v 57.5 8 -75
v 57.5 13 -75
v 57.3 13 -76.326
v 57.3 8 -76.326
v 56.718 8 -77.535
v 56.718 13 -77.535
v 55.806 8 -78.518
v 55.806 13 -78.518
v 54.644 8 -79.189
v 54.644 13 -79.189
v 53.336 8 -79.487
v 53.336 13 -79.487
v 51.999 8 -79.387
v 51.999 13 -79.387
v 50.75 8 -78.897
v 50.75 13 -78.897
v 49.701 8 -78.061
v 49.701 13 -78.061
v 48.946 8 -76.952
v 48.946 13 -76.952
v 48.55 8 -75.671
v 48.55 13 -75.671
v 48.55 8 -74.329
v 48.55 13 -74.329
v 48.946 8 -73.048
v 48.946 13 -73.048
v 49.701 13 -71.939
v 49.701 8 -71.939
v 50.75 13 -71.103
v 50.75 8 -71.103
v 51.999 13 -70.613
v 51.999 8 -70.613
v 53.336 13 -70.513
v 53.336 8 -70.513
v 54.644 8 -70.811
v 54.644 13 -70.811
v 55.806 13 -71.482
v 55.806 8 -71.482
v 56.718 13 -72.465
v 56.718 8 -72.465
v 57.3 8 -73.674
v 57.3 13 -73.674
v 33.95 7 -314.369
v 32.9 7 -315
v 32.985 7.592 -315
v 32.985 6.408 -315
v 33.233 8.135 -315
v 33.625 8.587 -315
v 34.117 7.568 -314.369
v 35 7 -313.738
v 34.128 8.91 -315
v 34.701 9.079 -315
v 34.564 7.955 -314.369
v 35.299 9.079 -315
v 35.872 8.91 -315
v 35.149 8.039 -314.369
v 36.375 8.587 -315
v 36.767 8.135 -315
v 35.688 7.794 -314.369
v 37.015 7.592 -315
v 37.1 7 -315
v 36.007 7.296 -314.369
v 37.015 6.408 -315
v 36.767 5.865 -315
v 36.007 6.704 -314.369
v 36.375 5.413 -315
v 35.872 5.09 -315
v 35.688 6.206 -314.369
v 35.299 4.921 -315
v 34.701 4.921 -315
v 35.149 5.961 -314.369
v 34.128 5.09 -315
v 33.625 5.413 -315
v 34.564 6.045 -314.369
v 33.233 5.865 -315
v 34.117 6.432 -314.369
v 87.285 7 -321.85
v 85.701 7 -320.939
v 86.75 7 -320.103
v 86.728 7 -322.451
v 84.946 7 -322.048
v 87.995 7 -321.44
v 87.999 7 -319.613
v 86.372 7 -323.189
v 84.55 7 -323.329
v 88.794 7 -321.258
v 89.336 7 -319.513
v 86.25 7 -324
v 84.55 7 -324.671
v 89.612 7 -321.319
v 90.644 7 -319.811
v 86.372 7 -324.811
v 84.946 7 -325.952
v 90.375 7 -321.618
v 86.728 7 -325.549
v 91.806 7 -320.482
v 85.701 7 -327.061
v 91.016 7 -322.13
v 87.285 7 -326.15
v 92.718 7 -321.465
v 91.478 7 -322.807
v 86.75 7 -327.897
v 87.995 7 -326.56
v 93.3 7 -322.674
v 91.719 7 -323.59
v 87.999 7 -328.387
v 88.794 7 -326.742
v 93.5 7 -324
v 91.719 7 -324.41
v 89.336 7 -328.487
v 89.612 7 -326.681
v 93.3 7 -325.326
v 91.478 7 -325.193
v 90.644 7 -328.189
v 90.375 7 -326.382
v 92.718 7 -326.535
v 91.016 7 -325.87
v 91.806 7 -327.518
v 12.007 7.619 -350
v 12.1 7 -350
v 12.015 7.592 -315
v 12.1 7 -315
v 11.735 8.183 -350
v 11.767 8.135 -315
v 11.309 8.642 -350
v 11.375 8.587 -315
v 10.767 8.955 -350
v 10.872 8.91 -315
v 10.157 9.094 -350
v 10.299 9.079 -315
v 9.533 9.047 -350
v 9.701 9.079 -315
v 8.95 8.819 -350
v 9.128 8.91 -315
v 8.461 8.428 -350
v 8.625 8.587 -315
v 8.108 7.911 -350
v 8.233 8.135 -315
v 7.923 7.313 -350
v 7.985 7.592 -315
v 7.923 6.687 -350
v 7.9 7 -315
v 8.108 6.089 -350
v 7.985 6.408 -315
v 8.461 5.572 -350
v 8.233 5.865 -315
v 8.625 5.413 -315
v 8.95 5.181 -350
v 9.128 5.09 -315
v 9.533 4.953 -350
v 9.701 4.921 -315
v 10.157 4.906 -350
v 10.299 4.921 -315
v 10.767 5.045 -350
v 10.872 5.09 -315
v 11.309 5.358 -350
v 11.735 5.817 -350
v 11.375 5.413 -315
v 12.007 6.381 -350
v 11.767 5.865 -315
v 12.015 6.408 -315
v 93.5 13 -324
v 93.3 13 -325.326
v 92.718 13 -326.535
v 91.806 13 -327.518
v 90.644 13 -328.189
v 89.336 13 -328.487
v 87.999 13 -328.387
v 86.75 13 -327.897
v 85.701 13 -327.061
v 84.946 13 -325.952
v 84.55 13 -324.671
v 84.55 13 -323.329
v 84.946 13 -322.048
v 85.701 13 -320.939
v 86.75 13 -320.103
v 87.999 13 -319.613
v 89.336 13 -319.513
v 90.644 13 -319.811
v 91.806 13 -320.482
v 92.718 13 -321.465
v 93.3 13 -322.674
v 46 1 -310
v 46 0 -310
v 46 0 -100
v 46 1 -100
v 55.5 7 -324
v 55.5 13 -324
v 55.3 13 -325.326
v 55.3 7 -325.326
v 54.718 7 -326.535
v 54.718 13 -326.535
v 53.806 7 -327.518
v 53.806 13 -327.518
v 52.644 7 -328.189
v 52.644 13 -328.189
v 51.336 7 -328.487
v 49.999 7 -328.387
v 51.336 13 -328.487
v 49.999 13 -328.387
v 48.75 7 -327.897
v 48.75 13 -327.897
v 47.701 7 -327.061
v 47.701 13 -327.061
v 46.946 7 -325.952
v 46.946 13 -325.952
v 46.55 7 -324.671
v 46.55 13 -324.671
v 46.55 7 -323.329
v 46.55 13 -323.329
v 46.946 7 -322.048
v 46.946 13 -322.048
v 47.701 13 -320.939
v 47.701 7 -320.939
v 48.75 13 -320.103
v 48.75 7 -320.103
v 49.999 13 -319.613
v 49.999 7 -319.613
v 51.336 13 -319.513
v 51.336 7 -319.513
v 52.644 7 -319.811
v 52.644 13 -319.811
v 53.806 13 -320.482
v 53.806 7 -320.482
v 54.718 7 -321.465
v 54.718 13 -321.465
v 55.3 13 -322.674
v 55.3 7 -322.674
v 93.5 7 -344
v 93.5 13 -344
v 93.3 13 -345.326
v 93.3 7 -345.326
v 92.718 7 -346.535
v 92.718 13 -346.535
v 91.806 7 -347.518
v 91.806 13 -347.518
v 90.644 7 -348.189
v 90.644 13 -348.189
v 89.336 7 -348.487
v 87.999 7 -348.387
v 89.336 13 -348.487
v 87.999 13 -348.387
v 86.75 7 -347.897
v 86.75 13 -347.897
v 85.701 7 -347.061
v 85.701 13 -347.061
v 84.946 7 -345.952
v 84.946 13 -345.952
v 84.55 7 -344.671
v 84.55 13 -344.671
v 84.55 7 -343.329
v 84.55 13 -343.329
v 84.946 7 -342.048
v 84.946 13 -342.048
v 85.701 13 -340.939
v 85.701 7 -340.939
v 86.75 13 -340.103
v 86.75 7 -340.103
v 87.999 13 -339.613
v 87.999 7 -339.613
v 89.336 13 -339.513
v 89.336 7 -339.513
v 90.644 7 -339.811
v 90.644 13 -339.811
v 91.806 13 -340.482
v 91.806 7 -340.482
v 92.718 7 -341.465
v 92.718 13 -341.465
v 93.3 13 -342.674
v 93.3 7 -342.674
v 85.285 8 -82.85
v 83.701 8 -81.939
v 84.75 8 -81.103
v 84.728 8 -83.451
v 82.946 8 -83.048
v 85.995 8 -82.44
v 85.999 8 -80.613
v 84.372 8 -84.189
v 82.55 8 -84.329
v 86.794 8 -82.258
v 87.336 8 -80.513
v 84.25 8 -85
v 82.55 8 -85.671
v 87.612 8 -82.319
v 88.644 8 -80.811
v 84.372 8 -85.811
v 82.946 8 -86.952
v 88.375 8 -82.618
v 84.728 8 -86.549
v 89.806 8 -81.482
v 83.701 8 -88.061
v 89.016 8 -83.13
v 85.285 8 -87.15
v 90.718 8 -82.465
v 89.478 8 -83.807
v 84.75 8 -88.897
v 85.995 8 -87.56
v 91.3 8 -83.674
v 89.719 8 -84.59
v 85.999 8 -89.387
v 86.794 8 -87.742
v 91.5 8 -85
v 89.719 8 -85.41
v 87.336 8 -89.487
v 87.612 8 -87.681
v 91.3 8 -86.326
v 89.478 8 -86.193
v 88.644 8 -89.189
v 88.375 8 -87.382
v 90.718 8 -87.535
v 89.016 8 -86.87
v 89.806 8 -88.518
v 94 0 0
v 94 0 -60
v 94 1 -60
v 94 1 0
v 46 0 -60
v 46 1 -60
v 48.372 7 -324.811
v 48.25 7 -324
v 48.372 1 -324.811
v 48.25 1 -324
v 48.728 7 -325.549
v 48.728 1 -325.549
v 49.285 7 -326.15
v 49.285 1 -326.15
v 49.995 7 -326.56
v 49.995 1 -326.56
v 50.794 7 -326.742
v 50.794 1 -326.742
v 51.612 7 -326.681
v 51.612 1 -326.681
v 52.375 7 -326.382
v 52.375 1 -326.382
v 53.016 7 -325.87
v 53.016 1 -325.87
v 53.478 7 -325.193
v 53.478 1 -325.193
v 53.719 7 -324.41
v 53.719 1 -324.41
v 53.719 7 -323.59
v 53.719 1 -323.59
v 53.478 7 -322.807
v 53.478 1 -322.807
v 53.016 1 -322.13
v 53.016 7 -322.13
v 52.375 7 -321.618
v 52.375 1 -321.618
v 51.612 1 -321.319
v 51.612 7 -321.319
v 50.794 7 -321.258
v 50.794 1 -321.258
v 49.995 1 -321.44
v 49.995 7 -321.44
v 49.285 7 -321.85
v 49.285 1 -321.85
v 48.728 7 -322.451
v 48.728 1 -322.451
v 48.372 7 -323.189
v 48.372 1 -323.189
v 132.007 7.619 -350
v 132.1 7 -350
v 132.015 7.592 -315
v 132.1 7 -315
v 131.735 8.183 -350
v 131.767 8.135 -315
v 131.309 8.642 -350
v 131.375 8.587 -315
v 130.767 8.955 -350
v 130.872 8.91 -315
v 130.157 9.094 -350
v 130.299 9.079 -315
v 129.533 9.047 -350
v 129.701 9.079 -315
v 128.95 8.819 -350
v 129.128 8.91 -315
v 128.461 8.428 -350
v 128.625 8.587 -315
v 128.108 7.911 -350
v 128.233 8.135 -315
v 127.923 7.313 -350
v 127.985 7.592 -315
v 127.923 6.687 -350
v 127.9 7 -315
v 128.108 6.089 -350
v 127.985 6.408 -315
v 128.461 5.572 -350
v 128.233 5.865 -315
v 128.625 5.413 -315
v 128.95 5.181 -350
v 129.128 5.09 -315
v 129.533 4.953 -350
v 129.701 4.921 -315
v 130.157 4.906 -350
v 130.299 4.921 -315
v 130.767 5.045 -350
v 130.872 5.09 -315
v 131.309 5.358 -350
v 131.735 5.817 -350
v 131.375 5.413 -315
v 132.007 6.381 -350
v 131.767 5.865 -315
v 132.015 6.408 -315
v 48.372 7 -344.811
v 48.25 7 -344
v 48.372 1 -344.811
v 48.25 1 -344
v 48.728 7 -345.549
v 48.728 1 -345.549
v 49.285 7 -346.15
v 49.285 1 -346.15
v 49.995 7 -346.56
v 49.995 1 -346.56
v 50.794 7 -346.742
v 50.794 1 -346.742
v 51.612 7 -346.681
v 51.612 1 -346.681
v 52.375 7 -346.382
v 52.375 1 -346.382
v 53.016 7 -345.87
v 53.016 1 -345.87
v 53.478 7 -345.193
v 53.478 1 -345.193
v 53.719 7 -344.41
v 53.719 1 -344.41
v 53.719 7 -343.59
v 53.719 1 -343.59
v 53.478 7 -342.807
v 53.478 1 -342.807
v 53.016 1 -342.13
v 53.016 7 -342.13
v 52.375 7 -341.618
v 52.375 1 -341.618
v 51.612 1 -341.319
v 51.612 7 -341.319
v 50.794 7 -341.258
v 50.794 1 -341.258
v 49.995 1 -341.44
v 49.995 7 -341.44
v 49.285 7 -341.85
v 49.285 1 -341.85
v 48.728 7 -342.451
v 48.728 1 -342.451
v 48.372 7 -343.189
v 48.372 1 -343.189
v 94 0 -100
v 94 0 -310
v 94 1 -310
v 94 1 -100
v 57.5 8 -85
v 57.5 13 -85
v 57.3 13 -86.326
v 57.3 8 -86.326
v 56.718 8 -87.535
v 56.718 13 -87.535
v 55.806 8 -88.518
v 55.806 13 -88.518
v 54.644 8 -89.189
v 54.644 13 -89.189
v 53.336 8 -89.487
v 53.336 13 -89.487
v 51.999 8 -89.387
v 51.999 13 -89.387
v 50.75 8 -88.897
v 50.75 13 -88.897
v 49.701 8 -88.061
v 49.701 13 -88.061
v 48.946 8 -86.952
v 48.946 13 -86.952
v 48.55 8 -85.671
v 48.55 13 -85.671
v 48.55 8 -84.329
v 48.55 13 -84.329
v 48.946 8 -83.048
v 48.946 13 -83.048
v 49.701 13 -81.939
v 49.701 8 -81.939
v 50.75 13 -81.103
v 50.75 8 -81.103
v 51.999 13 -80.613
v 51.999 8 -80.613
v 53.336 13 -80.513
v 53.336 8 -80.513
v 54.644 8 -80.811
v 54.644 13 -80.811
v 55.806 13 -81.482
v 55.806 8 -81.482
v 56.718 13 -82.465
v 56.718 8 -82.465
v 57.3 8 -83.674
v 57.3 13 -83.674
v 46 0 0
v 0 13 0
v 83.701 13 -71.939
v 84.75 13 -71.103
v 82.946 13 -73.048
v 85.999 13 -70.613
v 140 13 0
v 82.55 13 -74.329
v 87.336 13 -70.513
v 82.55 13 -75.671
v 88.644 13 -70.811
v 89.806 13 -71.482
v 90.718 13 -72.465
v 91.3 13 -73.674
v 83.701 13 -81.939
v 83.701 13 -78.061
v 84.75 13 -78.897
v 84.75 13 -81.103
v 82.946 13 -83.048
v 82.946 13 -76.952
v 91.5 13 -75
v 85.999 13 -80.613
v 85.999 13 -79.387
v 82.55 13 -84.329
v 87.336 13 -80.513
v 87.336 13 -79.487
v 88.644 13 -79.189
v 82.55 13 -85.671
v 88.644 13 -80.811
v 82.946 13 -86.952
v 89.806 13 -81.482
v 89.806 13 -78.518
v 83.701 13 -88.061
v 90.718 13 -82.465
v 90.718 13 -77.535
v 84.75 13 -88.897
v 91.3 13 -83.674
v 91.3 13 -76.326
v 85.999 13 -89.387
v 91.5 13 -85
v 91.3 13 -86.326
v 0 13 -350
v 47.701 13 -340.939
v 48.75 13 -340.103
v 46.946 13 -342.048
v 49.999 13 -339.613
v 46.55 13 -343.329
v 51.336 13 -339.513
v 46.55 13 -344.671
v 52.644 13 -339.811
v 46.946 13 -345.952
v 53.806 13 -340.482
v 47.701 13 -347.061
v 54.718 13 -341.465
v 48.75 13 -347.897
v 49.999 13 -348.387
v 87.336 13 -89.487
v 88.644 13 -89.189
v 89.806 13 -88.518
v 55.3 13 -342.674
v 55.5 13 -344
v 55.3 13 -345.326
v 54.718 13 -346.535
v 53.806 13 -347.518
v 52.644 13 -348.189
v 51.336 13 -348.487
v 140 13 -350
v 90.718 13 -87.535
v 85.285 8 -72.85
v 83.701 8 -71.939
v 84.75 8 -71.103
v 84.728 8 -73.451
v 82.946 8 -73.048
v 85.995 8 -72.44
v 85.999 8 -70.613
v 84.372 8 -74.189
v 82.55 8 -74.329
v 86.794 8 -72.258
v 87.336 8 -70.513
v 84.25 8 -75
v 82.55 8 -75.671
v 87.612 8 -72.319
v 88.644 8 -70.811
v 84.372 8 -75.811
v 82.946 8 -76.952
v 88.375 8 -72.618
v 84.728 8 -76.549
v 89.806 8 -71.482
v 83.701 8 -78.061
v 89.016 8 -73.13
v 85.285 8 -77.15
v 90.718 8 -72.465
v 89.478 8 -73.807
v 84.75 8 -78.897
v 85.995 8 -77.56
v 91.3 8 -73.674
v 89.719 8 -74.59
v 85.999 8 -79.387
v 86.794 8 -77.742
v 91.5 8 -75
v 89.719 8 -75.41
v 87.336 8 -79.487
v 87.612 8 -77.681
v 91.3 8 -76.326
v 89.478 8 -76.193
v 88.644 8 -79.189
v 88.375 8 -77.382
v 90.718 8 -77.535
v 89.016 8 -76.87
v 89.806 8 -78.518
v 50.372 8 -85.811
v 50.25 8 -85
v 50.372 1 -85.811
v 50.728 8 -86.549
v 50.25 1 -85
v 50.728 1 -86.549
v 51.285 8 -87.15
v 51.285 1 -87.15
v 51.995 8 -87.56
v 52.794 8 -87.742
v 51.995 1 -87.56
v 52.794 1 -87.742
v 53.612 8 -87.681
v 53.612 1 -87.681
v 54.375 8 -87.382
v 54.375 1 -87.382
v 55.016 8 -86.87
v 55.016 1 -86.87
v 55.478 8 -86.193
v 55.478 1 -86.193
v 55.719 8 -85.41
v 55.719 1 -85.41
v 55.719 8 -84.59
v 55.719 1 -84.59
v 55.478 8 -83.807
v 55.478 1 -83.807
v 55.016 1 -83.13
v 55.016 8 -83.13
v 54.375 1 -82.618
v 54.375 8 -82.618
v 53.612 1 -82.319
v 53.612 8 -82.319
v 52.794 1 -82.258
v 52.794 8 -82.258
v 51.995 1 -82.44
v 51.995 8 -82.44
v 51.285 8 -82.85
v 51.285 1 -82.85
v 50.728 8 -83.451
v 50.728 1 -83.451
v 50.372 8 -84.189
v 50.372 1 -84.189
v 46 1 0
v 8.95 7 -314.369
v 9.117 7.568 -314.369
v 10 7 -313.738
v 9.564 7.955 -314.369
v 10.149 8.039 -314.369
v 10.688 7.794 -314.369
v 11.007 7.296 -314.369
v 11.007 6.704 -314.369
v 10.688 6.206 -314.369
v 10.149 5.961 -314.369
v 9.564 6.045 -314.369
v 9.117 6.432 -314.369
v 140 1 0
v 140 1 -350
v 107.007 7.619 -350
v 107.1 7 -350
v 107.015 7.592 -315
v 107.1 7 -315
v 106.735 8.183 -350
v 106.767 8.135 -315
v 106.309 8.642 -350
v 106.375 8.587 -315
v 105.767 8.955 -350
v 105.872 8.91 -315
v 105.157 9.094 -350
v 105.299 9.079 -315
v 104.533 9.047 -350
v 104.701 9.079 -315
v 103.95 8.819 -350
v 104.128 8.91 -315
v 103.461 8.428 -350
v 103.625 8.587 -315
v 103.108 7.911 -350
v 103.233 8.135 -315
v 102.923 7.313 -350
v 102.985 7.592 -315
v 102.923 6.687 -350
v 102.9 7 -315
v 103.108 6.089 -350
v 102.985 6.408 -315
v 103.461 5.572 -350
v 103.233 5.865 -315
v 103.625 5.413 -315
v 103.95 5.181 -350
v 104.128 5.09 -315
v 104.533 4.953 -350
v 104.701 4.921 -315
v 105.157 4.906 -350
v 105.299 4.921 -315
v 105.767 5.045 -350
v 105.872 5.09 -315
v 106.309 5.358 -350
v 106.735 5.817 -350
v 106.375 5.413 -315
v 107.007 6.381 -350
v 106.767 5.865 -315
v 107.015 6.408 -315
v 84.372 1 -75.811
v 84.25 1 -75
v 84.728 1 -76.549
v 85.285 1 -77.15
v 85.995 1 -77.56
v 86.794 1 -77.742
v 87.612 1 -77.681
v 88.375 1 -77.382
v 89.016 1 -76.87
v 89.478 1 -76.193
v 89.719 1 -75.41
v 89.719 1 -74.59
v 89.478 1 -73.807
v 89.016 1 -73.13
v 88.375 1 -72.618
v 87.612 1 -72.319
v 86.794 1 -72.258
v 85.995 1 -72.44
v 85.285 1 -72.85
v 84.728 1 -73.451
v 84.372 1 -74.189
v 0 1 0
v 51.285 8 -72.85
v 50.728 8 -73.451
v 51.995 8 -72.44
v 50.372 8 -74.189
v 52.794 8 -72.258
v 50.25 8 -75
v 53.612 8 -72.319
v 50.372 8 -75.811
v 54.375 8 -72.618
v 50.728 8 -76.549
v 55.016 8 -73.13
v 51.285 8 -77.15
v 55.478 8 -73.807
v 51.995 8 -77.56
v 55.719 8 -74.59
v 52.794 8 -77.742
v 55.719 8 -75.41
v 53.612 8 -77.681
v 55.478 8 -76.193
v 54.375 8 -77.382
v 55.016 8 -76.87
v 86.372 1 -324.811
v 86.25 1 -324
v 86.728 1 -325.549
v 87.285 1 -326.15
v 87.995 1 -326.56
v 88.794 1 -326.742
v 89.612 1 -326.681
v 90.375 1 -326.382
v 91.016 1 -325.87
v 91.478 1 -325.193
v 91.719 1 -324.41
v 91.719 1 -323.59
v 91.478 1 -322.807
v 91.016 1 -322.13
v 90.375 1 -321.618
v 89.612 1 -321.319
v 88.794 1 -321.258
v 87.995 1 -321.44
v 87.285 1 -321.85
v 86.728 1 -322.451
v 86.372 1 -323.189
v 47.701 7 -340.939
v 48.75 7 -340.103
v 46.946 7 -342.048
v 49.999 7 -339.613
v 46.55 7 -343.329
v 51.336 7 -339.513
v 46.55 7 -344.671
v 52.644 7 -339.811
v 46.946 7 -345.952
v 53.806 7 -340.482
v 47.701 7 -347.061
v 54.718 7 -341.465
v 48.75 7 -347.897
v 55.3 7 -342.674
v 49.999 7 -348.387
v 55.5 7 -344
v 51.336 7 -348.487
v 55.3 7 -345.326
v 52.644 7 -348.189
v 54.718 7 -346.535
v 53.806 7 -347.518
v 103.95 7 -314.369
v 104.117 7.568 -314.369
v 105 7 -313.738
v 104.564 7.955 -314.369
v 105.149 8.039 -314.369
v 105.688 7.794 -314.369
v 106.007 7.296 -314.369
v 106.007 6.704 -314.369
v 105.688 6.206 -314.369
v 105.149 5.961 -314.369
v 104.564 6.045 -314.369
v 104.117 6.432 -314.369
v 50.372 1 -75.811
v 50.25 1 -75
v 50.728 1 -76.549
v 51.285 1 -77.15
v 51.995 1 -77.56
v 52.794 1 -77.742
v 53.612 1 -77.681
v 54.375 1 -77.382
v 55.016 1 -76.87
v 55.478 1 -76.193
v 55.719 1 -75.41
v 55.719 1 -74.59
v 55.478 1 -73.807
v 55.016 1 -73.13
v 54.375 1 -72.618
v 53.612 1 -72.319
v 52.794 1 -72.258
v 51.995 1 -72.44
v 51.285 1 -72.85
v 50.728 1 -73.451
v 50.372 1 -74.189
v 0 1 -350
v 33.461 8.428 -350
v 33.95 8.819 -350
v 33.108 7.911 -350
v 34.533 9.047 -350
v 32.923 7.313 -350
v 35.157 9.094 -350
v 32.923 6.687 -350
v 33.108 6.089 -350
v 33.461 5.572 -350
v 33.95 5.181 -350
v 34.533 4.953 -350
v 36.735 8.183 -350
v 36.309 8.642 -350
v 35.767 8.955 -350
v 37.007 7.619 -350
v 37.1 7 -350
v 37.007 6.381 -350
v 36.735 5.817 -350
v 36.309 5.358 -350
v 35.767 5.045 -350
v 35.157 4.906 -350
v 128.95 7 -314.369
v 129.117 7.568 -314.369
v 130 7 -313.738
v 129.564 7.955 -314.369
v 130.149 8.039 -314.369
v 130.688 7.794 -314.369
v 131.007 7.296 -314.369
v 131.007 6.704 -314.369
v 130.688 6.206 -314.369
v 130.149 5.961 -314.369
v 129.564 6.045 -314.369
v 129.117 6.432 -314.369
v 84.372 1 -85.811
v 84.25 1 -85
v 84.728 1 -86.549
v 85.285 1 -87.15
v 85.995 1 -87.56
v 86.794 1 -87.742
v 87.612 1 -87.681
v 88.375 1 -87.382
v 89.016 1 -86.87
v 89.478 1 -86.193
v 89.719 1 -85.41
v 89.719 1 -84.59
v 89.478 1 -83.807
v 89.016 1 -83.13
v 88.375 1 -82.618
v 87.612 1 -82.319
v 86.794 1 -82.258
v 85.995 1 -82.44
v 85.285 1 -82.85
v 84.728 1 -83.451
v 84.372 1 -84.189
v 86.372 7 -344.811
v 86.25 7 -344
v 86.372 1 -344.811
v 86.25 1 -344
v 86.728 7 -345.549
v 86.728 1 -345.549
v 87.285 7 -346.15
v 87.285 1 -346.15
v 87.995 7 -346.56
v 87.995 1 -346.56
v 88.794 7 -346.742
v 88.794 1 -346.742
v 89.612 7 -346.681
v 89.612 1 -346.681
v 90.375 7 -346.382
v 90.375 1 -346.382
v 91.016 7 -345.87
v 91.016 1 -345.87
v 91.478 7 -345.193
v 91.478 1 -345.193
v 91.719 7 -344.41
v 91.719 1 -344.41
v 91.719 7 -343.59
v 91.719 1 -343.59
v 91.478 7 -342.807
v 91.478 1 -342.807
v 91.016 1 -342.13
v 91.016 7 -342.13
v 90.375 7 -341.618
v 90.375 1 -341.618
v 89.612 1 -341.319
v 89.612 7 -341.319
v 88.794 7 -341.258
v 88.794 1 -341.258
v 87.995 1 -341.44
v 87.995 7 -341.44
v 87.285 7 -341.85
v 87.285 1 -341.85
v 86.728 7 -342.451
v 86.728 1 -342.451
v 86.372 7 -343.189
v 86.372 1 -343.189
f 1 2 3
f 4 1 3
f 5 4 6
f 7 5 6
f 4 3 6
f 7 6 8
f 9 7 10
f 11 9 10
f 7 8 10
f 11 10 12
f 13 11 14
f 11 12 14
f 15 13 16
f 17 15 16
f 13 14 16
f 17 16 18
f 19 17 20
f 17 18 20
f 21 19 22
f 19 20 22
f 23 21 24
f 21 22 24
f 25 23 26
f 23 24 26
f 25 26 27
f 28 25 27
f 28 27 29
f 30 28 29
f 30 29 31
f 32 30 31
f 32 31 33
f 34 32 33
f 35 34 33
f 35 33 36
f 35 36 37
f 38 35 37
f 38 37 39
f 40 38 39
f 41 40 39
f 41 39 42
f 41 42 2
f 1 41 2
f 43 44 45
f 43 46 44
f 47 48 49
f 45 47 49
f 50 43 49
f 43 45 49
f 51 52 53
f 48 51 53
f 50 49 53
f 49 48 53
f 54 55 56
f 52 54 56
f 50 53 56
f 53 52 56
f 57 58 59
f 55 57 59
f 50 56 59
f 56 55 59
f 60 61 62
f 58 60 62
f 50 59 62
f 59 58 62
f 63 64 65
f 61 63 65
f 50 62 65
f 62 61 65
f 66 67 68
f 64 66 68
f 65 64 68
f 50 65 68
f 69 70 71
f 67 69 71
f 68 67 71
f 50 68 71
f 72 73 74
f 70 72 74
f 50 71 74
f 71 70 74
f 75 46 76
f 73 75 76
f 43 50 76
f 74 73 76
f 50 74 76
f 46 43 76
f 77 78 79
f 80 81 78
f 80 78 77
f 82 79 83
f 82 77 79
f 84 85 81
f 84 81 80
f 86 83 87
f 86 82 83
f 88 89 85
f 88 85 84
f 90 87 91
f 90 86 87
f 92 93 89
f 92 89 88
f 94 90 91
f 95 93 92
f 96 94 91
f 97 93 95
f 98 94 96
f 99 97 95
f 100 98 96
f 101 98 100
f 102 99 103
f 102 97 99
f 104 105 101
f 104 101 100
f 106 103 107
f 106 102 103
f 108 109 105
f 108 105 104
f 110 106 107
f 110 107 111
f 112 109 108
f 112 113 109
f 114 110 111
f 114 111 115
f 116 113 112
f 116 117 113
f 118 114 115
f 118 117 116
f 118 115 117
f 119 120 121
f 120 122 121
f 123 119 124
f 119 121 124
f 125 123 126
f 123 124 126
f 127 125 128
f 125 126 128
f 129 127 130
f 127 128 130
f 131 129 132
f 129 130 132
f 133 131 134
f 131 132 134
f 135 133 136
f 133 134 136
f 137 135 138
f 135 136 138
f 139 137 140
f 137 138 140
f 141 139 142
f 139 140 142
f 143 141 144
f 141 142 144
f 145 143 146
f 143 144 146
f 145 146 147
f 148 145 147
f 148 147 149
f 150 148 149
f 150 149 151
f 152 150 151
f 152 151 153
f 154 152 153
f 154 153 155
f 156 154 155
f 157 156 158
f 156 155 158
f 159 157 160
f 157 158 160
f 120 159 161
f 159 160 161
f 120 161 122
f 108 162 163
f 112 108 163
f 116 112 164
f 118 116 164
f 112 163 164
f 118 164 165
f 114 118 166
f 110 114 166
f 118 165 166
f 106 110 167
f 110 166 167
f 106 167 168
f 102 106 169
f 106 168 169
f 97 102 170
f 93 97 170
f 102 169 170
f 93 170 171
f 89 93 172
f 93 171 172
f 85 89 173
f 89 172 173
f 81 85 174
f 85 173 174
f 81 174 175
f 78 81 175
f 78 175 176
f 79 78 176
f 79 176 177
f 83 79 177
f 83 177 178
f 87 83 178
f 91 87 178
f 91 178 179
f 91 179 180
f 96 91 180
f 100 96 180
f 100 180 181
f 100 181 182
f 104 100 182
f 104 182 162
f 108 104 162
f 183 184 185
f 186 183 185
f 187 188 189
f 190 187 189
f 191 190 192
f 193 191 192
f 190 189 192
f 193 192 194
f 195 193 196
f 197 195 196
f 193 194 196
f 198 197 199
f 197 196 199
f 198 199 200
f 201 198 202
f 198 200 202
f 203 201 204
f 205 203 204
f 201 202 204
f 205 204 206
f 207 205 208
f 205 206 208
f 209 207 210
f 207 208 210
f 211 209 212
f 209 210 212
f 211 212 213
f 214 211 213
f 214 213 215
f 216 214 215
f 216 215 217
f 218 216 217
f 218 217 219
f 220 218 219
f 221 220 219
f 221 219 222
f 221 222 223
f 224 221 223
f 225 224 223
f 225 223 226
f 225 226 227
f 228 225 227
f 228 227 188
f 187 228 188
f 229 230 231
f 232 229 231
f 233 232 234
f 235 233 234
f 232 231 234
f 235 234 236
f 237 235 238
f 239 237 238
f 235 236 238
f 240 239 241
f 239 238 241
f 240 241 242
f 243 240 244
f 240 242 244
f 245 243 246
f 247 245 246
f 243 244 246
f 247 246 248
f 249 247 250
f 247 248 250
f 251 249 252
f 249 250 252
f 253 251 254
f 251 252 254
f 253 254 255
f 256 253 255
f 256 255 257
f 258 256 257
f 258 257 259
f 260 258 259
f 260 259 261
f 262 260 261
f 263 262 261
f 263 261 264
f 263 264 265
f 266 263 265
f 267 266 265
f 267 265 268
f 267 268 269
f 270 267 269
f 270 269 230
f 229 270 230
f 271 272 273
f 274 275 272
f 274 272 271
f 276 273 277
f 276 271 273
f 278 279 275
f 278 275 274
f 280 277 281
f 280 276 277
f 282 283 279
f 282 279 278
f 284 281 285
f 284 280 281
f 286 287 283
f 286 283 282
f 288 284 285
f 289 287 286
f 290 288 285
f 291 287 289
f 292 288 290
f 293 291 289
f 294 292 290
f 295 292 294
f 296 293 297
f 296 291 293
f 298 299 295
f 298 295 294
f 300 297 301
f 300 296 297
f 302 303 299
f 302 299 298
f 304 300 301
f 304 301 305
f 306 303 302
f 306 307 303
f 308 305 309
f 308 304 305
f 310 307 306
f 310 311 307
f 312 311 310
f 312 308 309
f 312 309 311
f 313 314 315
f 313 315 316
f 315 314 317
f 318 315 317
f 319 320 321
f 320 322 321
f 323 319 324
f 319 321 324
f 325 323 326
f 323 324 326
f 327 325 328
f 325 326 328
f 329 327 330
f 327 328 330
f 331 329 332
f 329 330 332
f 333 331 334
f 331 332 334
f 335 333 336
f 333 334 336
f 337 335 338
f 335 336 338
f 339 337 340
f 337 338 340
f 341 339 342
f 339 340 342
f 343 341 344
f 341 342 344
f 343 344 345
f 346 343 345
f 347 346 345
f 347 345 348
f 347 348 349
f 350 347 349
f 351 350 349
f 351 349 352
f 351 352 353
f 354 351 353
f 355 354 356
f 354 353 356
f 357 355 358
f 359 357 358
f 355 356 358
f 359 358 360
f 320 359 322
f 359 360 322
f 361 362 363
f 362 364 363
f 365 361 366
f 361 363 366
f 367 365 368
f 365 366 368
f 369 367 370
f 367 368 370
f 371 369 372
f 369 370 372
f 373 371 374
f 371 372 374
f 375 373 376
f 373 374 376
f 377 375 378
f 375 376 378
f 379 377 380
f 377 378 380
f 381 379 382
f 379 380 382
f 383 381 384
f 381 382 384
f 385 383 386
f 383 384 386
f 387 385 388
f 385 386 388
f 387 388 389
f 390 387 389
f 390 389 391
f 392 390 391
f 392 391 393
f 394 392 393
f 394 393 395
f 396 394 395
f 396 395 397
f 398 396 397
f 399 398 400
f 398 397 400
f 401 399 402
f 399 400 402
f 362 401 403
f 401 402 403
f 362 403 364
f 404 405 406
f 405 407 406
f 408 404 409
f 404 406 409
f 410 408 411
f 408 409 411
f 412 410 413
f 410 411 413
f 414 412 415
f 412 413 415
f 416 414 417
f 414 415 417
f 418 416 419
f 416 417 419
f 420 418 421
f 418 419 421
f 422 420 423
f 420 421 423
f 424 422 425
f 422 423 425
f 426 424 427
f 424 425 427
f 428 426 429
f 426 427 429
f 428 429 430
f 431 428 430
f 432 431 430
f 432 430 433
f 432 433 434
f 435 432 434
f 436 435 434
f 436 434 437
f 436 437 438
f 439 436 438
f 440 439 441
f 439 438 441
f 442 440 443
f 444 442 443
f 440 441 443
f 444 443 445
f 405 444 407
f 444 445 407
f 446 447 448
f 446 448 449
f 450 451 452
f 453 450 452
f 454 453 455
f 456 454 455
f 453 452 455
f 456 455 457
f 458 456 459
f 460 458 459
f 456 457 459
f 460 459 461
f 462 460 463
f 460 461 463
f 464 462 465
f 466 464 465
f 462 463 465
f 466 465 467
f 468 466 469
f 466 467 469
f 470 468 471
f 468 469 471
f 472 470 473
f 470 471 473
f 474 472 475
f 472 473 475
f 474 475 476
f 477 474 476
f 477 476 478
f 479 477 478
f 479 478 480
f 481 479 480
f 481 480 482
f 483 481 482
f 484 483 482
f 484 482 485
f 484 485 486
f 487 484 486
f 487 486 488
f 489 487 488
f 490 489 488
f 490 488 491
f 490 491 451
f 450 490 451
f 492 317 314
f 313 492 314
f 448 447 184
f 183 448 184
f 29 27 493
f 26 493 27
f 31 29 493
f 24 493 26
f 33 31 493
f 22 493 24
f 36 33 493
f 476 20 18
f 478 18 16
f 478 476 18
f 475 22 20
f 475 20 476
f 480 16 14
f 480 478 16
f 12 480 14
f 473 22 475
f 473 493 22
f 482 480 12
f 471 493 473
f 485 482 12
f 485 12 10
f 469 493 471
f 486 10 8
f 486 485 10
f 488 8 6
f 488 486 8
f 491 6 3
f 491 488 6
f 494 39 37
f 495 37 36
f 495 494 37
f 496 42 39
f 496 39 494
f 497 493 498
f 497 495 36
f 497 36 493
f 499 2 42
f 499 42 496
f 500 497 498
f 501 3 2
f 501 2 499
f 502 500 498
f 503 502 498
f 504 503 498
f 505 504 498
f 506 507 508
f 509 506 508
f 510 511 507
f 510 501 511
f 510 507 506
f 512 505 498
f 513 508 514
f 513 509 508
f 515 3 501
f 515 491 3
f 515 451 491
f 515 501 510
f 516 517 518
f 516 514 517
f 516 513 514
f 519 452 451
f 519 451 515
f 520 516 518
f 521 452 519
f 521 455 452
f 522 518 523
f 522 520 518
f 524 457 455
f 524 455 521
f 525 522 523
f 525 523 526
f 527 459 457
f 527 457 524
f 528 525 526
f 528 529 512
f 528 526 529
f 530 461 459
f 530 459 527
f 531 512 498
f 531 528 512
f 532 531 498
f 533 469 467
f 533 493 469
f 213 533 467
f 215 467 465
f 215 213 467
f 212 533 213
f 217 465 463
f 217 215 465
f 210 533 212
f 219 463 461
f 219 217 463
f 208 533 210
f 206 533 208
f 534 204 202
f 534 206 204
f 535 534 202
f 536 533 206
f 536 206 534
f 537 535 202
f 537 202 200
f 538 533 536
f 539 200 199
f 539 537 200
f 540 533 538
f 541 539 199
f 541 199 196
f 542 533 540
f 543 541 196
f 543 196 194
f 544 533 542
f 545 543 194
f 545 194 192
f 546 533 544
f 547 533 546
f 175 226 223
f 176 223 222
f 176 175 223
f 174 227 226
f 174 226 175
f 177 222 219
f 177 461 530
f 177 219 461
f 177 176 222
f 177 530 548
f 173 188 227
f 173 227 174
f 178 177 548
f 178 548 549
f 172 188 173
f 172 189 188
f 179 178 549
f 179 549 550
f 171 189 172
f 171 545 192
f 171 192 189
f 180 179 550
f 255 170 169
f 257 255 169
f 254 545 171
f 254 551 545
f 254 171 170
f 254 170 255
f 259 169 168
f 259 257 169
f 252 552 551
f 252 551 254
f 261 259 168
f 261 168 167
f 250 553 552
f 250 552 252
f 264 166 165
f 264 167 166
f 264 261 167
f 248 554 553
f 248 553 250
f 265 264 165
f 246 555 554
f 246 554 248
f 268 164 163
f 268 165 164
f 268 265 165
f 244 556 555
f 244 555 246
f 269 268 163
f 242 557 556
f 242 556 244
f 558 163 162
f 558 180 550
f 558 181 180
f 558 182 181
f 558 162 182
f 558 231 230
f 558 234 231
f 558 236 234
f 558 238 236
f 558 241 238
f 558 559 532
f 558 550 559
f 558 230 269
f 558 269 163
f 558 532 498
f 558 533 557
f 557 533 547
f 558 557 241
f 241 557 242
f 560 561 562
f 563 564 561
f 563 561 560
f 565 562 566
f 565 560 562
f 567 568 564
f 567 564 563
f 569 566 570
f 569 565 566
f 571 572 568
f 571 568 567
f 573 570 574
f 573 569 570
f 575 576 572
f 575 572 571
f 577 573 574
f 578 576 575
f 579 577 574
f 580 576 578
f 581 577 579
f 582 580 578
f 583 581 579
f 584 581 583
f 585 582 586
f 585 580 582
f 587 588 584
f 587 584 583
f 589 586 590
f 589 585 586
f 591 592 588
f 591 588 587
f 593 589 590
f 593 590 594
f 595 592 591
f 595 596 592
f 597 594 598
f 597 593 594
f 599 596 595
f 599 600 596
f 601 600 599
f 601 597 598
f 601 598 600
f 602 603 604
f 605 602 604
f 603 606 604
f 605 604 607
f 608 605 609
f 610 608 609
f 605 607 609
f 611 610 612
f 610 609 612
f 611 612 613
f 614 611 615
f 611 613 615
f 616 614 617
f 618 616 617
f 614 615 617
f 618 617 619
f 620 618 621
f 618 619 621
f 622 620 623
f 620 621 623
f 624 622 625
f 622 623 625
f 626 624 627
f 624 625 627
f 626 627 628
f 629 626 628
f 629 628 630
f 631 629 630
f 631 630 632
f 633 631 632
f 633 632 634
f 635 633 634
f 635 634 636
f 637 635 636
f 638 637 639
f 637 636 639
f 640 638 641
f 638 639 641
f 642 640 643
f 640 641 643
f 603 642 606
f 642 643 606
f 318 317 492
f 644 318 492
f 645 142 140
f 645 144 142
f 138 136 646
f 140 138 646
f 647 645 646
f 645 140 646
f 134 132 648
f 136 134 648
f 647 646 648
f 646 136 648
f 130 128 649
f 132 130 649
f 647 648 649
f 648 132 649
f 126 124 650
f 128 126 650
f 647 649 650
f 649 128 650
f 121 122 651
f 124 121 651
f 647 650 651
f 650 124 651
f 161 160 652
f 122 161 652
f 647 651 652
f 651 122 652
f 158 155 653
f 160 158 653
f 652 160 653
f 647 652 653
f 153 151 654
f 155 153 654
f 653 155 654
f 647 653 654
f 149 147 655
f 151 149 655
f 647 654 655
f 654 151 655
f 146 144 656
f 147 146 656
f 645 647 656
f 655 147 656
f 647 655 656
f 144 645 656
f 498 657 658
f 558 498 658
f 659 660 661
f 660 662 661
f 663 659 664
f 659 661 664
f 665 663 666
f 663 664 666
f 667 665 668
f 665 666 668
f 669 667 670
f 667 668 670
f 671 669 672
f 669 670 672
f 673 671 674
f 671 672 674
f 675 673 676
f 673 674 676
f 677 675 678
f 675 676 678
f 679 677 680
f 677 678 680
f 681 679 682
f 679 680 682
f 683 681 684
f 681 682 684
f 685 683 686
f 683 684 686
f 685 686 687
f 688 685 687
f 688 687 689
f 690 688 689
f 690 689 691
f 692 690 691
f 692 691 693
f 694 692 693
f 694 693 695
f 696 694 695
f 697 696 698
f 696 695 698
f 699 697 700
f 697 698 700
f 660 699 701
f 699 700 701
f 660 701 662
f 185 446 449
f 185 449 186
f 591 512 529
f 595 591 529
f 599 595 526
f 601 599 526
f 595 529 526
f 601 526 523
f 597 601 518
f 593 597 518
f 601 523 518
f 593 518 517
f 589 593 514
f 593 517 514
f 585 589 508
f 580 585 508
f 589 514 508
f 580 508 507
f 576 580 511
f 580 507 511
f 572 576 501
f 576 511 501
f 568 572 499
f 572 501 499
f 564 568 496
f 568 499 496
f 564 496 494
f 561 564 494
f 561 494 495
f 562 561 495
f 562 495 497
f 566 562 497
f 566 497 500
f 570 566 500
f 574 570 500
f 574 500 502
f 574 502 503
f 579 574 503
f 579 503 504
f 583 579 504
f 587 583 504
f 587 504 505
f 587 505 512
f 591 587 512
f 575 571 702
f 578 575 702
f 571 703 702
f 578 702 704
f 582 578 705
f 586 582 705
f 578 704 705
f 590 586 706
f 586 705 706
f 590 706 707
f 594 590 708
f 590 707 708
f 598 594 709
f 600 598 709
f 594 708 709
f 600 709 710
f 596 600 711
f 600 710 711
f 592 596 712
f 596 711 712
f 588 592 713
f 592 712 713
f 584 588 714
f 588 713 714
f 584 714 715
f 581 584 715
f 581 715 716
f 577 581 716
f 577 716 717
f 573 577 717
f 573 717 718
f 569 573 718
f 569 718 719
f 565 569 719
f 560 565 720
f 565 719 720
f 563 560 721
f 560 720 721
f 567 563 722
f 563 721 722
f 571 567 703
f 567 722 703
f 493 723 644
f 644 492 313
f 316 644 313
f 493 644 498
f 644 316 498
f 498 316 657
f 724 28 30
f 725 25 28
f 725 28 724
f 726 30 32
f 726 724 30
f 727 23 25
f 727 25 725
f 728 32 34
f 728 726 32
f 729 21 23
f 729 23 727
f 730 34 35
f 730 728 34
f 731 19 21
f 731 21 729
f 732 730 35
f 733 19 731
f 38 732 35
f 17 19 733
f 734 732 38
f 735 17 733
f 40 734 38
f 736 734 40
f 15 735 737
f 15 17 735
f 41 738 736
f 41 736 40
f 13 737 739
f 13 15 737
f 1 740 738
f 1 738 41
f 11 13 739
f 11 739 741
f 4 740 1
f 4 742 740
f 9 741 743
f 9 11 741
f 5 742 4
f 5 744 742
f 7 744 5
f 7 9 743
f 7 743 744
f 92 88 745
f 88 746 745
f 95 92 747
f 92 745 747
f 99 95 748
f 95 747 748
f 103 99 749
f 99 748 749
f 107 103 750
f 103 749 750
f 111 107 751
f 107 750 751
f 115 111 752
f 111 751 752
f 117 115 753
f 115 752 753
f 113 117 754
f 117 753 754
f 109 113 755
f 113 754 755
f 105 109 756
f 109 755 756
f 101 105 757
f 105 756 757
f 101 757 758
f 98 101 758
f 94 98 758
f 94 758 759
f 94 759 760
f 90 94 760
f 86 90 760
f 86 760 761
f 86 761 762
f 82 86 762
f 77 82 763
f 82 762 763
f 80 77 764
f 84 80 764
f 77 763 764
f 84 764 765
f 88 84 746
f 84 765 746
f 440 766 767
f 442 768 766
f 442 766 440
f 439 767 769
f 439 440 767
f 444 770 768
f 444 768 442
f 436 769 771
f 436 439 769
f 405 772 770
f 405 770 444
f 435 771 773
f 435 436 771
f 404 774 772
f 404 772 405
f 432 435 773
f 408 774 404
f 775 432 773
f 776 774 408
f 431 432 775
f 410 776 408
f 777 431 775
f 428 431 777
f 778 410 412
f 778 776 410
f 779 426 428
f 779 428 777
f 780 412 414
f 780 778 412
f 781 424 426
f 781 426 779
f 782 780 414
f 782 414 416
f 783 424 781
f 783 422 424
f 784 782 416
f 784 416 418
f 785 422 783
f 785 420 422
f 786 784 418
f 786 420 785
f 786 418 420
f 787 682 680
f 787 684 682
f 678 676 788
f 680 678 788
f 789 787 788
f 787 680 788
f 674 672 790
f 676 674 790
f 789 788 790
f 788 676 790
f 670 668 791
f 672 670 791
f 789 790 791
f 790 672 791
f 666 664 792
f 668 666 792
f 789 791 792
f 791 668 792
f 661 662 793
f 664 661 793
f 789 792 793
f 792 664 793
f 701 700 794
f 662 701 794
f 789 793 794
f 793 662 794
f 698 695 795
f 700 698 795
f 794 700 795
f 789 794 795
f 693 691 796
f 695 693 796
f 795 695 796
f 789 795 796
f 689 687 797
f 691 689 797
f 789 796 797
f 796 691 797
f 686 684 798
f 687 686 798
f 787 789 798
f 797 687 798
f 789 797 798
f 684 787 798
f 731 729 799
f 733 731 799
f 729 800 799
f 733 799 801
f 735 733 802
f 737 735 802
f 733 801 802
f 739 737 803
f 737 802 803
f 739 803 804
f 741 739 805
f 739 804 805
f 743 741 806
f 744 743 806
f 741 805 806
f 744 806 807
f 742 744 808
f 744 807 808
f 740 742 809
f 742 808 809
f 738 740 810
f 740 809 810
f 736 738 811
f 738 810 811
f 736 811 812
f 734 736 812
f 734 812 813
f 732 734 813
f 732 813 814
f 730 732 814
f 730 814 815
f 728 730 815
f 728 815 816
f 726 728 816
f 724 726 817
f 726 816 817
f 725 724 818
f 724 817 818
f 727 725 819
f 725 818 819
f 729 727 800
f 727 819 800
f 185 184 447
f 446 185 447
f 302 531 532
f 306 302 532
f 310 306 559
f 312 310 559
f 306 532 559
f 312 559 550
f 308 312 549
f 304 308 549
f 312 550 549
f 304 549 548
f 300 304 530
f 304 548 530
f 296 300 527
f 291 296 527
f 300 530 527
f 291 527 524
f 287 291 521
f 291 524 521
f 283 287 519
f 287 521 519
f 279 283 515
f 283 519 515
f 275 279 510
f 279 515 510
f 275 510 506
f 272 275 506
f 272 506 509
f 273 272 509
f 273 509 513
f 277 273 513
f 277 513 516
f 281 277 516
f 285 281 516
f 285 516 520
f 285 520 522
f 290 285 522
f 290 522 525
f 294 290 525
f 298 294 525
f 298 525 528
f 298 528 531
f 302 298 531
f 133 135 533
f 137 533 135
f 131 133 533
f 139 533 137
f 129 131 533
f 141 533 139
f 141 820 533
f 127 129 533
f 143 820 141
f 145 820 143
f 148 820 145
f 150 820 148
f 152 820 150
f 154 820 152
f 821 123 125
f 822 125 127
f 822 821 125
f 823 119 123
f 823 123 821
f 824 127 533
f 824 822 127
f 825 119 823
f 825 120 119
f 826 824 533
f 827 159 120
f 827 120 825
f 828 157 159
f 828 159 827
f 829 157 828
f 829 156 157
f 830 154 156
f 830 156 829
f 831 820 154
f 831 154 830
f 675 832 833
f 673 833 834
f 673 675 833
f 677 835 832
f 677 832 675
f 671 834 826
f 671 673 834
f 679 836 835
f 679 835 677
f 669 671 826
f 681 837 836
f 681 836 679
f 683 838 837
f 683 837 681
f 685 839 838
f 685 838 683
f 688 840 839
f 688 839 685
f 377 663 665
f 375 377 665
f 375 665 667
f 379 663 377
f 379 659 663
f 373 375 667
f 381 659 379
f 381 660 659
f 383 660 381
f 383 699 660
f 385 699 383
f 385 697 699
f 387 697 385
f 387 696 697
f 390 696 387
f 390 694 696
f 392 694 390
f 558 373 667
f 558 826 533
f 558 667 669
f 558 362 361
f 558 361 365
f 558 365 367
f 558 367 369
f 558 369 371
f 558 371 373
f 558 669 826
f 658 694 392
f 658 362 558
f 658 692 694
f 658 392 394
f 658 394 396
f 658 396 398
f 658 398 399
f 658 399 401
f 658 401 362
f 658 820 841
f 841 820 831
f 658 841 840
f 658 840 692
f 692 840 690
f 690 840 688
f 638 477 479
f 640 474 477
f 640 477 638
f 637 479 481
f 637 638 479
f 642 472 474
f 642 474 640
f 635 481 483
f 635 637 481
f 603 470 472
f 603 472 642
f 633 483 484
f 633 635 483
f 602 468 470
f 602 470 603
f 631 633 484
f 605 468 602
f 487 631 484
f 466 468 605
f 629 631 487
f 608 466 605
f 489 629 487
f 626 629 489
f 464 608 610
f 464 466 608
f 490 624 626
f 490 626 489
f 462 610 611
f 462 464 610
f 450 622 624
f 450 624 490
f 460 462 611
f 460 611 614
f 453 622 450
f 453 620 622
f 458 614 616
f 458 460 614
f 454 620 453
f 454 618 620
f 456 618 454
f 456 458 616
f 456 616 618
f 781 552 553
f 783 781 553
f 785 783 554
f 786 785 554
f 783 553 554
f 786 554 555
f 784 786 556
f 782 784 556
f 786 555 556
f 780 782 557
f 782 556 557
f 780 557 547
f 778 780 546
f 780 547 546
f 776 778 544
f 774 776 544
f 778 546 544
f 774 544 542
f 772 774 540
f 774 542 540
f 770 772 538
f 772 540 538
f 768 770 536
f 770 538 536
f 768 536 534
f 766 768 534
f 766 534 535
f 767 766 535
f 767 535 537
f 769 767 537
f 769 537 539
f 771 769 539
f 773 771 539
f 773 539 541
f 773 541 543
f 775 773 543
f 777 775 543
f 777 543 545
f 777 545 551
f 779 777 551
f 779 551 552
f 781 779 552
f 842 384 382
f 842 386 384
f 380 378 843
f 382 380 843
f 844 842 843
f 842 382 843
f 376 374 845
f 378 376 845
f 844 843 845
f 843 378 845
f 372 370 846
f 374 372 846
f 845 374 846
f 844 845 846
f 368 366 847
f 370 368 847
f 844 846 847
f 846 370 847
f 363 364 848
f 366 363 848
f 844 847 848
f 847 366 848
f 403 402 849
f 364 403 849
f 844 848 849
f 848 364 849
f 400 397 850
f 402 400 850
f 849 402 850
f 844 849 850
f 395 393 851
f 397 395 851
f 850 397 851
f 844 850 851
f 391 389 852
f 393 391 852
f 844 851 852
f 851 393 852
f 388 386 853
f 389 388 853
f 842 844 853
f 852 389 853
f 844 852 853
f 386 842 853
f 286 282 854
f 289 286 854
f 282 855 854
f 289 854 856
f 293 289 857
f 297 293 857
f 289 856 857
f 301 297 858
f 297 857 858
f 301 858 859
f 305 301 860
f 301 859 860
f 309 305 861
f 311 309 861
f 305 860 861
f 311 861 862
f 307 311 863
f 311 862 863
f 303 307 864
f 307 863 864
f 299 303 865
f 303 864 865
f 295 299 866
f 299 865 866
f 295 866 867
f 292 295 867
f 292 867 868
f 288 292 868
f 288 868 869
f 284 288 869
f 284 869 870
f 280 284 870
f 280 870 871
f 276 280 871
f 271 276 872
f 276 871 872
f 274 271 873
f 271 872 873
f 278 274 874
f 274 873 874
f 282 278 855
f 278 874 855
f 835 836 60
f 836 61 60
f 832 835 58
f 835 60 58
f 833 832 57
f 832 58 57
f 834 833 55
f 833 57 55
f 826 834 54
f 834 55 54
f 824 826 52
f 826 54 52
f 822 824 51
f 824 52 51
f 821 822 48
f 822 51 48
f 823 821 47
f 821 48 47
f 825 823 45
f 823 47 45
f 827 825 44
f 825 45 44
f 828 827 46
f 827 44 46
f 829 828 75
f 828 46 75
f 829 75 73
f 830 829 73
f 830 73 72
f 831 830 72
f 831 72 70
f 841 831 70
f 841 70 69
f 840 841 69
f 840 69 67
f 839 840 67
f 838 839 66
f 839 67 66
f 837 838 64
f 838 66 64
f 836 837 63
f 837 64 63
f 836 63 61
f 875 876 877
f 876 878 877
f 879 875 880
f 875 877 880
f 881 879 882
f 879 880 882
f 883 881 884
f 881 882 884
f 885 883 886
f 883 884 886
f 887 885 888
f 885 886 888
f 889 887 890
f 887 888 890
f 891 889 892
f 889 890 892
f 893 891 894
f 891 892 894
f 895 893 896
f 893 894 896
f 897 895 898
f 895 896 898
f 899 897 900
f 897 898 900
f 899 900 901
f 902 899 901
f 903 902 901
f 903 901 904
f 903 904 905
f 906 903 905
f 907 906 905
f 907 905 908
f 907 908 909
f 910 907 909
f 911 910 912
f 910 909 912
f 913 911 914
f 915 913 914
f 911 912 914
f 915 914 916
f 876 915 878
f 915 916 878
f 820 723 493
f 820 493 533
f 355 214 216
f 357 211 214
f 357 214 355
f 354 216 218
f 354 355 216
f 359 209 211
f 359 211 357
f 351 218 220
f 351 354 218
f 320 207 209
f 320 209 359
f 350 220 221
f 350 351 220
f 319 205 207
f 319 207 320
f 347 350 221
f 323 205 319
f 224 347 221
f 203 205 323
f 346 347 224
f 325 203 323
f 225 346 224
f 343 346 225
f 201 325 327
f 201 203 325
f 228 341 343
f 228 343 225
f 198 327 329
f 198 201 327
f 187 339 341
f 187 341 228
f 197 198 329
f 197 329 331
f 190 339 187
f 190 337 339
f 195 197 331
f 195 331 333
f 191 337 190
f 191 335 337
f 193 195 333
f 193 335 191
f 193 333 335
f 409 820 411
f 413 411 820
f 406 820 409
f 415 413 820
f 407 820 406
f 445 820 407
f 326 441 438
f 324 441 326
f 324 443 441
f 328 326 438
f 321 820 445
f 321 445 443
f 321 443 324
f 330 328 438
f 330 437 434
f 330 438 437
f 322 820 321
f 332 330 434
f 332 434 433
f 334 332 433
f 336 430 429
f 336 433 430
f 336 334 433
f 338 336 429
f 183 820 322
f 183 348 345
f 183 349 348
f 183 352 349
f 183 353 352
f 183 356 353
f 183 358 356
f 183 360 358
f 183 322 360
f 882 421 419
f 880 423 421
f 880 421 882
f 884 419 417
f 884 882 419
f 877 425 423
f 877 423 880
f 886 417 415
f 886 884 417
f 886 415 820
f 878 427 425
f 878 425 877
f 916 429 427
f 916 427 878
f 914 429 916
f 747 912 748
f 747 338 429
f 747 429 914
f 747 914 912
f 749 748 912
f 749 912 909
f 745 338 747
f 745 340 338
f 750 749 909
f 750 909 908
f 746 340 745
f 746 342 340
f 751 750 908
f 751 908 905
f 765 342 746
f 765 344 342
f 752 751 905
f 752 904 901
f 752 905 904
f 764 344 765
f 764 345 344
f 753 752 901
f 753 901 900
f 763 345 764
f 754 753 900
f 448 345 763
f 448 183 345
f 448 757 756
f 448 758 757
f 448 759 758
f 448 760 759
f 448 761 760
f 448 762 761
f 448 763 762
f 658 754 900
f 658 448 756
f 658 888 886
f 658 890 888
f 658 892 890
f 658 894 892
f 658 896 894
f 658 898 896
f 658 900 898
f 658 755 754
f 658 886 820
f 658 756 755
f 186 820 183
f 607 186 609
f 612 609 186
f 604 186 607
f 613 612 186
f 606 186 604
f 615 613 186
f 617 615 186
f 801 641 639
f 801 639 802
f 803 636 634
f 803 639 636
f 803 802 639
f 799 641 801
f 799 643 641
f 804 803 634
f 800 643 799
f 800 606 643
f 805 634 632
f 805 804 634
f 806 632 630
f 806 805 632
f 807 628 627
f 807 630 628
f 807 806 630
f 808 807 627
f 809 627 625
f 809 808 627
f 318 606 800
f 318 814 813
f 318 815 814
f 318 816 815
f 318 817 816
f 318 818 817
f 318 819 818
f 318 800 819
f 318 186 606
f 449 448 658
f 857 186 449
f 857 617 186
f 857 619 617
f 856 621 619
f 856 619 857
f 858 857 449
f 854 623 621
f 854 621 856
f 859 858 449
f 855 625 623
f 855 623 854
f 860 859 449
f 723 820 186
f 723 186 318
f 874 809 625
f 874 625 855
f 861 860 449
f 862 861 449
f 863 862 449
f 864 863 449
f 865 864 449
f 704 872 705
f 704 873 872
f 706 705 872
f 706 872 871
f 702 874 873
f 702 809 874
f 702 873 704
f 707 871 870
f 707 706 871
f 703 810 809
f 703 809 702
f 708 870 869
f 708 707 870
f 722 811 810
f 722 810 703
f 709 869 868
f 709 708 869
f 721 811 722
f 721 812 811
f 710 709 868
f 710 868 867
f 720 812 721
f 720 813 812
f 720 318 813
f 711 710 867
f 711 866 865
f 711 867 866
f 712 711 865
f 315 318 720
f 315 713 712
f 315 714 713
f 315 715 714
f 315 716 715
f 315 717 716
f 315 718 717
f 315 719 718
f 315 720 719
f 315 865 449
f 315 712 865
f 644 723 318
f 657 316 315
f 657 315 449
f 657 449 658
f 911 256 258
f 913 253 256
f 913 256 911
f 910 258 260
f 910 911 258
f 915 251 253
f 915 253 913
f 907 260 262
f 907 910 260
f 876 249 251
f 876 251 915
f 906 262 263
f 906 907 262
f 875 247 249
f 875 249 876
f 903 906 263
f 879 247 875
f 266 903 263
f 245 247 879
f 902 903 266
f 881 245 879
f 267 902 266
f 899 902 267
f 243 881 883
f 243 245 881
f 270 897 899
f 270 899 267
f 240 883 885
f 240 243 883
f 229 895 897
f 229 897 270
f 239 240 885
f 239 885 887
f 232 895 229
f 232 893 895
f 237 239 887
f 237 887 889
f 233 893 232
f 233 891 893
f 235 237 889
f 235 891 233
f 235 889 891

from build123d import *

# Parameters (mm, degrees)
SZKIC1_W                                             = 140
SZKIC1_H                                             = 350
DODANIE_WYCI_GNI_CIE1_DEPTH                          = 13
SZKIC2_W                                             = 46
SZKIC2_H                                             = 350
WYTNIJ_WYCI_GNI_CIE1_DEPTH                           = 1
OTW_R_GWINTOWANY_M5X0_81_D                           = 4.2
OTW_R_GWINTOWANY_M5X0_81_DEPTH                       = 35
OTW_R_GWINTOWANY_M5X0_81_TIP                         = 1.2618073
SZKIC12_W                                            = 48
SZKIC12_H                                            = 40
WYTNIJ_WYCI_GNI_CIE3_DEPTH                           = 1
POG_BIENIE_WALCOWE_POD_M5_WKR_T_DO_CZ_CI_D           = 5.5
POG_BIENIE_WALCOWE_POD_M5_WKR_T_DO_CZ_CI_CBORE_D     = 9
POG_BIENIE_WALCOWE_POD_M5_WKR_T_DO_CZ_CI_CBORE_DEPTH = 6
POG_BIENIE_WALCOWE_POD_M5_WKR_T_DO_C_2_D             = 5.5
POG_BIENIE_WALCOWE_POD_M5_WKR_T_DO_C_2_CBORE_D       = 9
POG_BIENIE_WALCOWE_POD_M5_WKR_T_DO_C_2_CBORE_DEPTH   = 5


with BuildPart() as part:
    # Szkic1 → Dodanie-wyciągnięcie1 (new body)
    with BuildSketch(Plane(origin=(0, 0, 0), x_dir=(1, 0, 0), z_dir=(0, 1, 0))):
        with Locations((70, 175)):
            Rectangle(SZKIC1_W, SZKIC1_H)
    extrude(amount=DODANIE_WYCI_GNI_CIE1_DEPTH)

    # Szkic2 → Wytnij-wyciągnięcie1 (cut)
    with BuildSketch(Plane.XZ):
        with Locations((23, -175)):
            Rectangle(SZKIC2_W, SZKIC2_H)
        with Locations((117, -175)):
            Rectangle(SZKIC2_W, SZKIC2_H)
    extrude(amount=-WYTNIJ_WYCI_GNI_CIE1_DEPTH, mode=Mode.SUBTRACT)

    # Otwór gwintowany M5x0.81
    with Locations(Plane(origin=(0, 0, -350), x_dir=(-1, 0, 0), z_dir=(0, 0, -1))):
        with Locations((-130, 7), (-105, 7), (-35, 7), (-10, 7)):
            Hole(OTW_R_GWINTOWANY_M5X0_81_D / 2, depth=OTW_R_GWINTOWANY_M5X0_81_DEPTH)
            with Locations((0, 0, -(OTW_R_GWINTOWANY_M5X0_81_DEPTH + OTW_R_GWINTOWANY_M5X0_81_TIP / 2))):  # 118° drill point
                Cone(0, OTW_R_GWINTOWANY_M5X0_81_D / 2, OTW_R_GWINTOWANY_M5X0_81_TIP, mode=Mode.SUBTRACT)

    # Szkic12 → Wytnij-wyciągnięcie3 (cut)
    with BuildSketch(Plane(origin=(0, 0, 0), x_dir=(-1, 0, 0), z_dir=(0, -1, 0))):
        with Locations((-70, 80)):
            Rectangle(SZKIC12_W, SZKIC12_H)
        with Locations((-70, 330)):
            Rectangle(SZKIC12_W, SZKIC12_H)
    extrude(amount=-WYTNIJ_WYCI_GNI_CIE3_DEPTH, mode=Mode.SUBTRACT)

    # Pog_bienie walcowe pod M5 Wkr_t do cz_ci (through all)
    with Locations(Plane(origin=(0, 13, 0), x_dir=(1, 0, 0), z_dir=(0, 1, 0))):
        with Locations((51, 344), (89, 344), (51, 324), (89, 324)):
            CounterBoreHole(POG_BIENIE_WALCOWE_POD_M5_WKR_T_DO_CZ_CI_D / 2, POG_BIENIE_WALCOWE_POD_M5_WKR_T_DO_CZ_CI_CBORE_D / 2, POG_BIENIE_WALCOWE_POD_M5_WKR_T_DO_CZ_CI_CBORE_DEPTH)

    # Pog_bienie walcowe pod M5 Wkr_t do c 2 (through all)
    with Locations(Plane(origin=(0, 13, 0), x_dir=(1, 0, 0), z_dir=(0, 1, 0))):
        with Locations((53, 85), (87, 85), (53, 75), (87, 75)):
            CounterBoreHole(POG_BIENIE_WALCOWE_POD_M5_WKR_T_DO_C_2_D / 2, POG_BIENIE_WALCOWE_POD_M5_WKR_T_DO_C_2_CBORE_D / 2, POG_BIENIE_WALCOWE_POD_M5_WKR_T_DO_C_2_CBORE_DEPTH)


solid = part.part
